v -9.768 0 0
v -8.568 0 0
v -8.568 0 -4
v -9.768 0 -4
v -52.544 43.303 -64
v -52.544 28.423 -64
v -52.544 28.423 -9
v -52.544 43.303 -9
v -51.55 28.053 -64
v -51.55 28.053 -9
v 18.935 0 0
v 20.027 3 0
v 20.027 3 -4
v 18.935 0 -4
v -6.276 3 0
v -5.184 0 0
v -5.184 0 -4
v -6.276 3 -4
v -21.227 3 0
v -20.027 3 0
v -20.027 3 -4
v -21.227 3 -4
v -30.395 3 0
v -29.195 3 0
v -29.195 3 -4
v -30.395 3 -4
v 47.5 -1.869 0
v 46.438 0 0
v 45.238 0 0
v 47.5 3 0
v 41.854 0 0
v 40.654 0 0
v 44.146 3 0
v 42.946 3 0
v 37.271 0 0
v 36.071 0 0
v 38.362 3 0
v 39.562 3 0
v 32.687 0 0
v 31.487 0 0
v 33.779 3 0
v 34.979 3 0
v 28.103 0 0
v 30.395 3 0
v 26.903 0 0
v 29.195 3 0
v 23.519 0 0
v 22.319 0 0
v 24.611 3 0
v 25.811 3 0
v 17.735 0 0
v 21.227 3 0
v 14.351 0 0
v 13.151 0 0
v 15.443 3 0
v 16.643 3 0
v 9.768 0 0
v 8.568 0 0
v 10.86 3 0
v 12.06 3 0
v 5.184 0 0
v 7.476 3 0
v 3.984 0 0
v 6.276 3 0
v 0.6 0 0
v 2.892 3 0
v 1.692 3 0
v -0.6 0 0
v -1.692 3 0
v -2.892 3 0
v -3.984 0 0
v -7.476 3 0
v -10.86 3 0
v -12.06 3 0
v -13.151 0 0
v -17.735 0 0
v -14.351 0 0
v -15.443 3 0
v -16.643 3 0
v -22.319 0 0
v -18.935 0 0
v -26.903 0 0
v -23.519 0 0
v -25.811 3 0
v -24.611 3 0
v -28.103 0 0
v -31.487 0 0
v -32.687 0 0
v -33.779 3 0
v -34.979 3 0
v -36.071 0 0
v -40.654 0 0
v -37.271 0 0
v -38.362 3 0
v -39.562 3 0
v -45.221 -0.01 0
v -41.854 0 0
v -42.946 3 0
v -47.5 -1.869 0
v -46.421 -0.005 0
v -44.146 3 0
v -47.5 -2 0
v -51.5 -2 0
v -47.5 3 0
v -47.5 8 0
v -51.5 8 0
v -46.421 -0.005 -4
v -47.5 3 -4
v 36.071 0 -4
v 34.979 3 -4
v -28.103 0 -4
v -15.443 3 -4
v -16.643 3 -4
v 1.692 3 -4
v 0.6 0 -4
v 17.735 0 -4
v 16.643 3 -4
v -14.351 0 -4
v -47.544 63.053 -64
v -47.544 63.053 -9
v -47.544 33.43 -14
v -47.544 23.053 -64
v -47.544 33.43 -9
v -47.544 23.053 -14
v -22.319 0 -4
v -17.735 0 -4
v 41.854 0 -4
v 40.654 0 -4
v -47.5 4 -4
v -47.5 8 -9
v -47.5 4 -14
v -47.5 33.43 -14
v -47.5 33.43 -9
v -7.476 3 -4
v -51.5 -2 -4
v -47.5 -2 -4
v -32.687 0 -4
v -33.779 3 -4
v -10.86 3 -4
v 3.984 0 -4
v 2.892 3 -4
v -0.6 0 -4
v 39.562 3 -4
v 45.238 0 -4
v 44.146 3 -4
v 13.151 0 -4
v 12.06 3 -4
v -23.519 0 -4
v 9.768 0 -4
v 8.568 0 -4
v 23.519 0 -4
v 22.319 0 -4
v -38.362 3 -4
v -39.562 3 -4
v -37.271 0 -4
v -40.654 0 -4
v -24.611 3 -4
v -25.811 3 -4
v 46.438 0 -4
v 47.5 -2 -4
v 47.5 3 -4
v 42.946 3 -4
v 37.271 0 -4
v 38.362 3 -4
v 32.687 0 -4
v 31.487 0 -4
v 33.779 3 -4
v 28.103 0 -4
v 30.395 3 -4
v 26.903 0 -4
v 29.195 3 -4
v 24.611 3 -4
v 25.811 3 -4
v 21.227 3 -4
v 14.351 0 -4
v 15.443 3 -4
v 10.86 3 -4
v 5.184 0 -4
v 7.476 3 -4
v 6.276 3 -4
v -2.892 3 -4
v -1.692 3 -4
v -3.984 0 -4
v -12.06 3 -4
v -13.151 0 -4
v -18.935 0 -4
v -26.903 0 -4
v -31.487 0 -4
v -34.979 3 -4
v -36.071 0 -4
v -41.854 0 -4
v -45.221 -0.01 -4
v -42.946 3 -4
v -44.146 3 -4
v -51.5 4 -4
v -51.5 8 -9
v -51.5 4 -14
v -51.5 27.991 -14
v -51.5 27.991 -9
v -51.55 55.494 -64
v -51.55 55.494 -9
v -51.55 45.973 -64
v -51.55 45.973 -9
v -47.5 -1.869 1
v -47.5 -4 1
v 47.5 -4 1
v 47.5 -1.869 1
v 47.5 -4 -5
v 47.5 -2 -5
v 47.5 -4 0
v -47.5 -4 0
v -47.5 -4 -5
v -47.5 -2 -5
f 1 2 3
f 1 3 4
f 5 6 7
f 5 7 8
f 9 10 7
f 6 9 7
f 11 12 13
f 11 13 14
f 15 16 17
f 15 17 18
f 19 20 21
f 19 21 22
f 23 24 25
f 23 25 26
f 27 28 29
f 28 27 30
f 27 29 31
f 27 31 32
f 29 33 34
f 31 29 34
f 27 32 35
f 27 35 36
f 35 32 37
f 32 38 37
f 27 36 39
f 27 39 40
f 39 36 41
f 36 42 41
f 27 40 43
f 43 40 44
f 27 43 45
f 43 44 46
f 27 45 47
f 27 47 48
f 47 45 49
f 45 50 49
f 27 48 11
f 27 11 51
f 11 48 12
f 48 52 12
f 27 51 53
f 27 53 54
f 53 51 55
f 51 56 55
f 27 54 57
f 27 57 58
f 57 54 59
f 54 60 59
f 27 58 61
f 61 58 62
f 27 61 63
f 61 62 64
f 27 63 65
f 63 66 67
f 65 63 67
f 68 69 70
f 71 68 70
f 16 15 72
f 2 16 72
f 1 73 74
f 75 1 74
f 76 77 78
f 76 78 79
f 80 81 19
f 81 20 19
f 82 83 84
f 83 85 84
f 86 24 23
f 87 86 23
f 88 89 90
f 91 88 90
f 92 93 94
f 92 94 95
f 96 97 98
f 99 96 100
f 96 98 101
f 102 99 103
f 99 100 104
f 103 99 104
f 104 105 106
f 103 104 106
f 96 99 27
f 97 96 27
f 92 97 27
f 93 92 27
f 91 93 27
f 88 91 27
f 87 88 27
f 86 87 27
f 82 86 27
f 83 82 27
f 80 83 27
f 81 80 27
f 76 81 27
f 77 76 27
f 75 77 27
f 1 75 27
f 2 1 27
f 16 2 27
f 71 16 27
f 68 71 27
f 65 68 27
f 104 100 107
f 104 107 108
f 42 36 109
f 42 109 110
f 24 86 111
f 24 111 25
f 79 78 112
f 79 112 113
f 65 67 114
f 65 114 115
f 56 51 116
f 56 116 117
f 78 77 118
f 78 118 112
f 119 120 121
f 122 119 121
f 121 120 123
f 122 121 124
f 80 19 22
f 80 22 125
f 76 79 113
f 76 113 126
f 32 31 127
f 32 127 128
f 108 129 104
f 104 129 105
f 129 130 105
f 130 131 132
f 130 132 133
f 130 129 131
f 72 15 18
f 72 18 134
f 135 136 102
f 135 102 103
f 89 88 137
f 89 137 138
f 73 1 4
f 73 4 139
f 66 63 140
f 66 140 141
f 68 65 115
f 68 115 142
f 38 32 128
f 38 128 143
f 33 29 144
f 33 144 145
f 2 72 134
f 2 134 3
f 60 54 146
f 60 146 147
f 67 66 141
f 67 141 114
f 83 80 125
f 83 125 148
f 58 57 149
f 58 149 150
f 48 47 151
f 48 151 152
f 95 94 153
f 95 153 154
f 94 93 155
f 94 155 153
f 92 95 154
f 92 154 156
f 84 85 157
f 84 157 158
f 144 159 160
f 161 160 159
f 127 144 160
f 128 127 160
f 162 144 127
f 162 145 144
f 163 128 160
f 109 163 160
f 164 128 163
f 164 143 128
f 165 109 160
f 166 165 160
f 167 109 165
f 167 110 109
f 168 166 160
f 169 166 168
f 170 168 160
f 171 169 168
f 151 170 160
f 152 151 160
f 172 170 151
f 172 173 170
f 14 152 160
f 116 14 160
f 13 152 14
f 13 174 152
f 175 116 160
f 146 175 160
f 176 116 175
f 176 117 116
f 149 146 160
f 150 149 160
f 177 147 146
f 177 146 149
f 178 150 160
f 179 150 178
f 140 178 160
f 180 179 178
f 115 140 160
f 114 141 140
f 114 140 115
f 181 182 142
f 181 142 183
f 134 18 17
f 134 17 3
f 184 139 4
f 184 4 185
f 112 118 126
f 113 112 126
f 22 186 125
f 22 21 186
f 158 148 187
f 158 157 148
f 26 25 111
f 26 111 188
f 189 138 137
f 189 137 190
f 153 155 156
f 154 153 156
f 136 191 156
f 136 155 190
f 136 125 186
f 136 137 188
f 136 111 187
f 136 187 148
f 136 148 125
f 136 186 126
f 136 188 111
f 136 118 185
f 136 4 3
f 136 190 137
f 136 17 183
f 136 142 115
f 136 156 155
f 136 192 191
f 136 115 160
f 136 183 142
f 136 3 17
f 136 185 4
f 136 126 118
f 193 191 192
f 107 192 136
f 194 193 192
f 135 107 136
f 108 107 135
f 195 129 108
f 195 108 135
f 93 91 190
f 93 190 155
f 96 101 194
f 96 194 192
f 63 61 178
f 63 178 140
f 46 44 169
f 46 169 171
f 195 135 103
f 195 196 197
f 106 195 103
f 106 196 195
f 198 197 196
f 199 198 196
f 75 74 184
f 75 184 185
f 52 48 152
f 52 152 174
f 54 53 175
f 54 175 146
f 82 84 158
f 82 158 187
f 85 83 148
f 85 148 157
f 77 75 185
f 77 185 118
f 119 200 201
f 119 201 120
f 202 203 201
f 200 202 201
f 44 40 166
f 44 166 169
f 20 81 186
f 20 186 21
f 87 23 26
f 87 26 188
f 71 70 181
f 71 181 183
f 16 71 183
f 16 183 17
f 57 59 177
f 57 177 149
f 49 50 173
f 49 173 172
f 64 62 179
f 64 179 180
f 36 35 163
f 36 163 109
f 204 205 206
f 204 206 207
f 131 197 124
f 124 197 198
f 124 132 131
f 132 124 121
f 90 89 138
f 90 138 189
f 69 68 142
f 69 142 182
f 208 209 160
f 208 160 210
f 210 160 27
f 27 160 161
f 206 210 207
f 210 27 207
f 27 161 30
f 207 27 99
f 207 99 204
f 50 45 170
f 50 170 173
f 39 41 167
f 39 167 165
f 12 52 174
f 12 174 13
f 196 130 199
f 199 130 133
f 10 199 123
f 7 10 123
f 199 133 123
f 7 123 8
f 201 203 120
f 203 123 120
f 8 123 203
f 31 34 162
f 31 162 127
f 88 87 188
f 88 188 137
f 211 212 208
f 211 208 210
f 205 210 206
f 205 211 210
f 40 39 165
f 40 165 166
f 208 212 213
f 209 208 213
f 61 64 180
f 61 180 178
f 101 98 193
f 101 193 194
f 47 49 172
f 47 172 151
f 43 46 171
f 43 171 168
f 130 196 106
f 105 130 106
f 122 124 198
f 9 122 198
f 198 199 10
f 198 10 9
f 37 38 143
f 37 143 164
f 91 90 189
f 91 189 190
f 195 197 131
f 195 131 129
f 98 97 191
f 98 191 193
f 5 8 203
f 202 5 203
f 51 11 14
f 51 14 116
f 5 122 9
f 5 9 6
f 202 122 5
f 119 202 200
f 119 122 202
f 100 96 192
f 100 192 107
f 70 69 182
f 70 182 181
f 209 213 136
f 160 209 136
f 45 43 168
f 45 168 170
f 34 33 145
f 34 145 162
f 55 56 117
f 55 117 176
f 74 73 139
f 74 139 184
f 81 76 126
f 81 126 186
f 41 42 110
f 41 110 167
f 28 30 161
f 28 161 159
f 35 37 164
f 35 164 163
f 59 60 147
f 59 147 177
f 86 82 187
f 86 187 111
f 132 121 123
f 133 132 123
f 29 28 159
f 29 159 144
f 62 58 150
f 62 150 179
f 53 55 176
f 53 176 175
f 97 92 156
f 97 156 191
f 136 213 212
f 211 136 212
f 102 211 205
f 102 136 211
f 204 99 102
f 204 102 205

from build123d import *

# Parameters (mm, degrees)
BOSS_EXTRU_1_DEPTH      = 4
ESQUISSE2_W             = 1
ESQUISSE2_H             = 2
ESQUISSE2_H_2           = 2.130975397
BOSS_EXTRU_2_DEPTH      = 95
ESQUISSE3_W             = 4
ESQUISSE3_H             = 10
BOSS_EXTRU_3_DEPTH      = 4
ESQUISSE4_W             = 10
ESQUISSE4_H             = 4
BOSS_EXTRU_4_DEPTH      = 4
ESQUISSE6_W             = 5
ESQUISSE6_H             = 29.43
BOSS_EXTRU_5_DEPTH      = 4
BOSS_EXTRU_6_DEPTH      = 50
BOSS_EXTRU_6_DEPTH_BACK = 5


with BuildPart() as part:
    # Esquisse1 → Boss.-Extru.1 (new body)
    with BuildSketch(Plane.XY):
        Polygon((0.6, 0), (-0.6, 0), (-1.691910703, 3), (-2.891910703, 3), (-3.983821406, 0), (-5.183821406, 0), (-6.275732108, 3), (-7.475732108, 3), (-8.567642811, 0), (-9.767642811, 0), (-10.859553514, 3), (-12.059553514, 3), (-13.151464217, 0), (-14.351464217, 0), (-15.44337492, 3), (-16.64337492, 3), (-17.735285622, 0), (-18.935285622, 0), (-20.027196325, 3), (-21.227196325, 3), (-22.319107028, 0), (-23.519107028, 0), (-24.611017731, 3), (-25.811017731, 3), (-26.902928434, 0), (-28.102928434, 0), (-29.194839136, 3), (-30.394839136, 3), (-31.486749839, 0), (-32.686749839, 0), (-33.778660542, 3), (-34.978660542, 3), (-36.070571245, 0), (-37.270571245, 0), (-38.362481948, 3), (-39.562481948, 3), (-40.65439265, 0), (-41.85439265, 0), (-42.946303353, 3), (-44.146303353, 3), (-45.221021012, -0.00977063), (-46.4210099, -0.004606433), (-47.5, 3.000064821), (-47.5, -4), (47.5, -4), (47.5, 3.000064821), (46.438214056, 0), (45.238214056, 0), (44.146303353, 3), (42.946303353, 3), (41.85439265, 0), (40.65439265, 0), (39.562481948, 3), (38.362481948, 3), (37.270571245, 0), (36.070571245, 0), (34.978660542, 3), (33.778660542, 3), (32.686749839, 0), (31.486749839, 0), (30.394839136, 3), (29.194839136, 3), (28.102928434, 0), (26.902928434, 0), (25.811017731, 3), (24.611017731, 3), (23.519107028, 0), (22.319107028, 0), (21.227196325, 3), (20.027196325, 3), (18.935285622, 0), (17.735285622, 0), (16.64337492, 3), (15.44337492, 3), (14.351464217, 0), (13.151464217, 0), (12.059553514, 3), (10.859553514, 3), (9.767642811, 0), (8.567642811, 0), (7.475732108, 3), (6.275732108, 3), (5.183821406, 0), (3.983821406, 0), (2.891910703, 3), (1.691910703, 3), align=None)
    extrude(amount=-BOSS_EXTRU_1_DEPTH)

    # Esquisse2 → Boss.-Extru.2 (add)
    with BuildSketch(Plane.ZY.offset(47.5)):
        with Locations((-4.5, -3)):
            Rectangle(ESQUISSE2_W, ESQUISSE2_H)
        with Locations((0.5, -2.934512301)):
            Rectangle(ESQUISSE2_W, ESQUISSE2_H_2)
    extrude(amount=-BOSS_EXTRU_2_DEPTH)

    # Esquisse3 → Boss.-Extru.3 (add)
    with BuildSketch(Plane(origin=(0, 0, -4), x_dir=(-1, 0, 0), z_dir=(0, 0, -1))):
        with Locations((49.5, 3)):
            Rectangle(ESQUISSE3_W, ESQUISSE3_H)
    extrude(amount=-BOSS_EXTRU_3_DEPTH)

    # Esquisse4 → Boss.-Extru.4 (add)
    with BuildSketch(Plane.ZY.offset(51.5)):
        with Locations((-9, 6)):
            Rectangle(ESQUISSE4_W, ESQUISSE4_H)
    extrude(amount=-BOSS_EXTRU_4_DEPTH)

    # Esquisse6 → Boss.-Extru.5 (add)
    with BuildSketch(Plane.ZY.offset(51.5)):
        with Locations((-11.5, 18.715)):
            Rectangle(ESQUISSE6_W, ESQUISSE6_H)
    extrude(amount=-BOSS_EXTRU_5_DEPTH)

    # Esquisse7 → Boss.-Extru.6 (add, two sides: drawn at the far end of the back side and taken through both)
    with BuildSketch(Plane(origin=(0, 0, -14), x_dir=(-1, 0, 0), z_dir=(0, 0, -1)).offset(-BOSS_EXTRU_6_DEPTH_BACK)):
        Polygon((47.543968479, 63.053350001), (47.543968479, 23.053350001), (51.550036892, 28.053350001), (52.543968479, 28.423350001), (52.543968479, 43.303350001), (51.550036892, 45.973350001), (51.550036892, 55.49434682), align=None)
    extrude(amount=BOSS_EXTRU_6_DEPTH + BOSS_EXTRU_6_DEPTH_BACK)


solid = part.part
